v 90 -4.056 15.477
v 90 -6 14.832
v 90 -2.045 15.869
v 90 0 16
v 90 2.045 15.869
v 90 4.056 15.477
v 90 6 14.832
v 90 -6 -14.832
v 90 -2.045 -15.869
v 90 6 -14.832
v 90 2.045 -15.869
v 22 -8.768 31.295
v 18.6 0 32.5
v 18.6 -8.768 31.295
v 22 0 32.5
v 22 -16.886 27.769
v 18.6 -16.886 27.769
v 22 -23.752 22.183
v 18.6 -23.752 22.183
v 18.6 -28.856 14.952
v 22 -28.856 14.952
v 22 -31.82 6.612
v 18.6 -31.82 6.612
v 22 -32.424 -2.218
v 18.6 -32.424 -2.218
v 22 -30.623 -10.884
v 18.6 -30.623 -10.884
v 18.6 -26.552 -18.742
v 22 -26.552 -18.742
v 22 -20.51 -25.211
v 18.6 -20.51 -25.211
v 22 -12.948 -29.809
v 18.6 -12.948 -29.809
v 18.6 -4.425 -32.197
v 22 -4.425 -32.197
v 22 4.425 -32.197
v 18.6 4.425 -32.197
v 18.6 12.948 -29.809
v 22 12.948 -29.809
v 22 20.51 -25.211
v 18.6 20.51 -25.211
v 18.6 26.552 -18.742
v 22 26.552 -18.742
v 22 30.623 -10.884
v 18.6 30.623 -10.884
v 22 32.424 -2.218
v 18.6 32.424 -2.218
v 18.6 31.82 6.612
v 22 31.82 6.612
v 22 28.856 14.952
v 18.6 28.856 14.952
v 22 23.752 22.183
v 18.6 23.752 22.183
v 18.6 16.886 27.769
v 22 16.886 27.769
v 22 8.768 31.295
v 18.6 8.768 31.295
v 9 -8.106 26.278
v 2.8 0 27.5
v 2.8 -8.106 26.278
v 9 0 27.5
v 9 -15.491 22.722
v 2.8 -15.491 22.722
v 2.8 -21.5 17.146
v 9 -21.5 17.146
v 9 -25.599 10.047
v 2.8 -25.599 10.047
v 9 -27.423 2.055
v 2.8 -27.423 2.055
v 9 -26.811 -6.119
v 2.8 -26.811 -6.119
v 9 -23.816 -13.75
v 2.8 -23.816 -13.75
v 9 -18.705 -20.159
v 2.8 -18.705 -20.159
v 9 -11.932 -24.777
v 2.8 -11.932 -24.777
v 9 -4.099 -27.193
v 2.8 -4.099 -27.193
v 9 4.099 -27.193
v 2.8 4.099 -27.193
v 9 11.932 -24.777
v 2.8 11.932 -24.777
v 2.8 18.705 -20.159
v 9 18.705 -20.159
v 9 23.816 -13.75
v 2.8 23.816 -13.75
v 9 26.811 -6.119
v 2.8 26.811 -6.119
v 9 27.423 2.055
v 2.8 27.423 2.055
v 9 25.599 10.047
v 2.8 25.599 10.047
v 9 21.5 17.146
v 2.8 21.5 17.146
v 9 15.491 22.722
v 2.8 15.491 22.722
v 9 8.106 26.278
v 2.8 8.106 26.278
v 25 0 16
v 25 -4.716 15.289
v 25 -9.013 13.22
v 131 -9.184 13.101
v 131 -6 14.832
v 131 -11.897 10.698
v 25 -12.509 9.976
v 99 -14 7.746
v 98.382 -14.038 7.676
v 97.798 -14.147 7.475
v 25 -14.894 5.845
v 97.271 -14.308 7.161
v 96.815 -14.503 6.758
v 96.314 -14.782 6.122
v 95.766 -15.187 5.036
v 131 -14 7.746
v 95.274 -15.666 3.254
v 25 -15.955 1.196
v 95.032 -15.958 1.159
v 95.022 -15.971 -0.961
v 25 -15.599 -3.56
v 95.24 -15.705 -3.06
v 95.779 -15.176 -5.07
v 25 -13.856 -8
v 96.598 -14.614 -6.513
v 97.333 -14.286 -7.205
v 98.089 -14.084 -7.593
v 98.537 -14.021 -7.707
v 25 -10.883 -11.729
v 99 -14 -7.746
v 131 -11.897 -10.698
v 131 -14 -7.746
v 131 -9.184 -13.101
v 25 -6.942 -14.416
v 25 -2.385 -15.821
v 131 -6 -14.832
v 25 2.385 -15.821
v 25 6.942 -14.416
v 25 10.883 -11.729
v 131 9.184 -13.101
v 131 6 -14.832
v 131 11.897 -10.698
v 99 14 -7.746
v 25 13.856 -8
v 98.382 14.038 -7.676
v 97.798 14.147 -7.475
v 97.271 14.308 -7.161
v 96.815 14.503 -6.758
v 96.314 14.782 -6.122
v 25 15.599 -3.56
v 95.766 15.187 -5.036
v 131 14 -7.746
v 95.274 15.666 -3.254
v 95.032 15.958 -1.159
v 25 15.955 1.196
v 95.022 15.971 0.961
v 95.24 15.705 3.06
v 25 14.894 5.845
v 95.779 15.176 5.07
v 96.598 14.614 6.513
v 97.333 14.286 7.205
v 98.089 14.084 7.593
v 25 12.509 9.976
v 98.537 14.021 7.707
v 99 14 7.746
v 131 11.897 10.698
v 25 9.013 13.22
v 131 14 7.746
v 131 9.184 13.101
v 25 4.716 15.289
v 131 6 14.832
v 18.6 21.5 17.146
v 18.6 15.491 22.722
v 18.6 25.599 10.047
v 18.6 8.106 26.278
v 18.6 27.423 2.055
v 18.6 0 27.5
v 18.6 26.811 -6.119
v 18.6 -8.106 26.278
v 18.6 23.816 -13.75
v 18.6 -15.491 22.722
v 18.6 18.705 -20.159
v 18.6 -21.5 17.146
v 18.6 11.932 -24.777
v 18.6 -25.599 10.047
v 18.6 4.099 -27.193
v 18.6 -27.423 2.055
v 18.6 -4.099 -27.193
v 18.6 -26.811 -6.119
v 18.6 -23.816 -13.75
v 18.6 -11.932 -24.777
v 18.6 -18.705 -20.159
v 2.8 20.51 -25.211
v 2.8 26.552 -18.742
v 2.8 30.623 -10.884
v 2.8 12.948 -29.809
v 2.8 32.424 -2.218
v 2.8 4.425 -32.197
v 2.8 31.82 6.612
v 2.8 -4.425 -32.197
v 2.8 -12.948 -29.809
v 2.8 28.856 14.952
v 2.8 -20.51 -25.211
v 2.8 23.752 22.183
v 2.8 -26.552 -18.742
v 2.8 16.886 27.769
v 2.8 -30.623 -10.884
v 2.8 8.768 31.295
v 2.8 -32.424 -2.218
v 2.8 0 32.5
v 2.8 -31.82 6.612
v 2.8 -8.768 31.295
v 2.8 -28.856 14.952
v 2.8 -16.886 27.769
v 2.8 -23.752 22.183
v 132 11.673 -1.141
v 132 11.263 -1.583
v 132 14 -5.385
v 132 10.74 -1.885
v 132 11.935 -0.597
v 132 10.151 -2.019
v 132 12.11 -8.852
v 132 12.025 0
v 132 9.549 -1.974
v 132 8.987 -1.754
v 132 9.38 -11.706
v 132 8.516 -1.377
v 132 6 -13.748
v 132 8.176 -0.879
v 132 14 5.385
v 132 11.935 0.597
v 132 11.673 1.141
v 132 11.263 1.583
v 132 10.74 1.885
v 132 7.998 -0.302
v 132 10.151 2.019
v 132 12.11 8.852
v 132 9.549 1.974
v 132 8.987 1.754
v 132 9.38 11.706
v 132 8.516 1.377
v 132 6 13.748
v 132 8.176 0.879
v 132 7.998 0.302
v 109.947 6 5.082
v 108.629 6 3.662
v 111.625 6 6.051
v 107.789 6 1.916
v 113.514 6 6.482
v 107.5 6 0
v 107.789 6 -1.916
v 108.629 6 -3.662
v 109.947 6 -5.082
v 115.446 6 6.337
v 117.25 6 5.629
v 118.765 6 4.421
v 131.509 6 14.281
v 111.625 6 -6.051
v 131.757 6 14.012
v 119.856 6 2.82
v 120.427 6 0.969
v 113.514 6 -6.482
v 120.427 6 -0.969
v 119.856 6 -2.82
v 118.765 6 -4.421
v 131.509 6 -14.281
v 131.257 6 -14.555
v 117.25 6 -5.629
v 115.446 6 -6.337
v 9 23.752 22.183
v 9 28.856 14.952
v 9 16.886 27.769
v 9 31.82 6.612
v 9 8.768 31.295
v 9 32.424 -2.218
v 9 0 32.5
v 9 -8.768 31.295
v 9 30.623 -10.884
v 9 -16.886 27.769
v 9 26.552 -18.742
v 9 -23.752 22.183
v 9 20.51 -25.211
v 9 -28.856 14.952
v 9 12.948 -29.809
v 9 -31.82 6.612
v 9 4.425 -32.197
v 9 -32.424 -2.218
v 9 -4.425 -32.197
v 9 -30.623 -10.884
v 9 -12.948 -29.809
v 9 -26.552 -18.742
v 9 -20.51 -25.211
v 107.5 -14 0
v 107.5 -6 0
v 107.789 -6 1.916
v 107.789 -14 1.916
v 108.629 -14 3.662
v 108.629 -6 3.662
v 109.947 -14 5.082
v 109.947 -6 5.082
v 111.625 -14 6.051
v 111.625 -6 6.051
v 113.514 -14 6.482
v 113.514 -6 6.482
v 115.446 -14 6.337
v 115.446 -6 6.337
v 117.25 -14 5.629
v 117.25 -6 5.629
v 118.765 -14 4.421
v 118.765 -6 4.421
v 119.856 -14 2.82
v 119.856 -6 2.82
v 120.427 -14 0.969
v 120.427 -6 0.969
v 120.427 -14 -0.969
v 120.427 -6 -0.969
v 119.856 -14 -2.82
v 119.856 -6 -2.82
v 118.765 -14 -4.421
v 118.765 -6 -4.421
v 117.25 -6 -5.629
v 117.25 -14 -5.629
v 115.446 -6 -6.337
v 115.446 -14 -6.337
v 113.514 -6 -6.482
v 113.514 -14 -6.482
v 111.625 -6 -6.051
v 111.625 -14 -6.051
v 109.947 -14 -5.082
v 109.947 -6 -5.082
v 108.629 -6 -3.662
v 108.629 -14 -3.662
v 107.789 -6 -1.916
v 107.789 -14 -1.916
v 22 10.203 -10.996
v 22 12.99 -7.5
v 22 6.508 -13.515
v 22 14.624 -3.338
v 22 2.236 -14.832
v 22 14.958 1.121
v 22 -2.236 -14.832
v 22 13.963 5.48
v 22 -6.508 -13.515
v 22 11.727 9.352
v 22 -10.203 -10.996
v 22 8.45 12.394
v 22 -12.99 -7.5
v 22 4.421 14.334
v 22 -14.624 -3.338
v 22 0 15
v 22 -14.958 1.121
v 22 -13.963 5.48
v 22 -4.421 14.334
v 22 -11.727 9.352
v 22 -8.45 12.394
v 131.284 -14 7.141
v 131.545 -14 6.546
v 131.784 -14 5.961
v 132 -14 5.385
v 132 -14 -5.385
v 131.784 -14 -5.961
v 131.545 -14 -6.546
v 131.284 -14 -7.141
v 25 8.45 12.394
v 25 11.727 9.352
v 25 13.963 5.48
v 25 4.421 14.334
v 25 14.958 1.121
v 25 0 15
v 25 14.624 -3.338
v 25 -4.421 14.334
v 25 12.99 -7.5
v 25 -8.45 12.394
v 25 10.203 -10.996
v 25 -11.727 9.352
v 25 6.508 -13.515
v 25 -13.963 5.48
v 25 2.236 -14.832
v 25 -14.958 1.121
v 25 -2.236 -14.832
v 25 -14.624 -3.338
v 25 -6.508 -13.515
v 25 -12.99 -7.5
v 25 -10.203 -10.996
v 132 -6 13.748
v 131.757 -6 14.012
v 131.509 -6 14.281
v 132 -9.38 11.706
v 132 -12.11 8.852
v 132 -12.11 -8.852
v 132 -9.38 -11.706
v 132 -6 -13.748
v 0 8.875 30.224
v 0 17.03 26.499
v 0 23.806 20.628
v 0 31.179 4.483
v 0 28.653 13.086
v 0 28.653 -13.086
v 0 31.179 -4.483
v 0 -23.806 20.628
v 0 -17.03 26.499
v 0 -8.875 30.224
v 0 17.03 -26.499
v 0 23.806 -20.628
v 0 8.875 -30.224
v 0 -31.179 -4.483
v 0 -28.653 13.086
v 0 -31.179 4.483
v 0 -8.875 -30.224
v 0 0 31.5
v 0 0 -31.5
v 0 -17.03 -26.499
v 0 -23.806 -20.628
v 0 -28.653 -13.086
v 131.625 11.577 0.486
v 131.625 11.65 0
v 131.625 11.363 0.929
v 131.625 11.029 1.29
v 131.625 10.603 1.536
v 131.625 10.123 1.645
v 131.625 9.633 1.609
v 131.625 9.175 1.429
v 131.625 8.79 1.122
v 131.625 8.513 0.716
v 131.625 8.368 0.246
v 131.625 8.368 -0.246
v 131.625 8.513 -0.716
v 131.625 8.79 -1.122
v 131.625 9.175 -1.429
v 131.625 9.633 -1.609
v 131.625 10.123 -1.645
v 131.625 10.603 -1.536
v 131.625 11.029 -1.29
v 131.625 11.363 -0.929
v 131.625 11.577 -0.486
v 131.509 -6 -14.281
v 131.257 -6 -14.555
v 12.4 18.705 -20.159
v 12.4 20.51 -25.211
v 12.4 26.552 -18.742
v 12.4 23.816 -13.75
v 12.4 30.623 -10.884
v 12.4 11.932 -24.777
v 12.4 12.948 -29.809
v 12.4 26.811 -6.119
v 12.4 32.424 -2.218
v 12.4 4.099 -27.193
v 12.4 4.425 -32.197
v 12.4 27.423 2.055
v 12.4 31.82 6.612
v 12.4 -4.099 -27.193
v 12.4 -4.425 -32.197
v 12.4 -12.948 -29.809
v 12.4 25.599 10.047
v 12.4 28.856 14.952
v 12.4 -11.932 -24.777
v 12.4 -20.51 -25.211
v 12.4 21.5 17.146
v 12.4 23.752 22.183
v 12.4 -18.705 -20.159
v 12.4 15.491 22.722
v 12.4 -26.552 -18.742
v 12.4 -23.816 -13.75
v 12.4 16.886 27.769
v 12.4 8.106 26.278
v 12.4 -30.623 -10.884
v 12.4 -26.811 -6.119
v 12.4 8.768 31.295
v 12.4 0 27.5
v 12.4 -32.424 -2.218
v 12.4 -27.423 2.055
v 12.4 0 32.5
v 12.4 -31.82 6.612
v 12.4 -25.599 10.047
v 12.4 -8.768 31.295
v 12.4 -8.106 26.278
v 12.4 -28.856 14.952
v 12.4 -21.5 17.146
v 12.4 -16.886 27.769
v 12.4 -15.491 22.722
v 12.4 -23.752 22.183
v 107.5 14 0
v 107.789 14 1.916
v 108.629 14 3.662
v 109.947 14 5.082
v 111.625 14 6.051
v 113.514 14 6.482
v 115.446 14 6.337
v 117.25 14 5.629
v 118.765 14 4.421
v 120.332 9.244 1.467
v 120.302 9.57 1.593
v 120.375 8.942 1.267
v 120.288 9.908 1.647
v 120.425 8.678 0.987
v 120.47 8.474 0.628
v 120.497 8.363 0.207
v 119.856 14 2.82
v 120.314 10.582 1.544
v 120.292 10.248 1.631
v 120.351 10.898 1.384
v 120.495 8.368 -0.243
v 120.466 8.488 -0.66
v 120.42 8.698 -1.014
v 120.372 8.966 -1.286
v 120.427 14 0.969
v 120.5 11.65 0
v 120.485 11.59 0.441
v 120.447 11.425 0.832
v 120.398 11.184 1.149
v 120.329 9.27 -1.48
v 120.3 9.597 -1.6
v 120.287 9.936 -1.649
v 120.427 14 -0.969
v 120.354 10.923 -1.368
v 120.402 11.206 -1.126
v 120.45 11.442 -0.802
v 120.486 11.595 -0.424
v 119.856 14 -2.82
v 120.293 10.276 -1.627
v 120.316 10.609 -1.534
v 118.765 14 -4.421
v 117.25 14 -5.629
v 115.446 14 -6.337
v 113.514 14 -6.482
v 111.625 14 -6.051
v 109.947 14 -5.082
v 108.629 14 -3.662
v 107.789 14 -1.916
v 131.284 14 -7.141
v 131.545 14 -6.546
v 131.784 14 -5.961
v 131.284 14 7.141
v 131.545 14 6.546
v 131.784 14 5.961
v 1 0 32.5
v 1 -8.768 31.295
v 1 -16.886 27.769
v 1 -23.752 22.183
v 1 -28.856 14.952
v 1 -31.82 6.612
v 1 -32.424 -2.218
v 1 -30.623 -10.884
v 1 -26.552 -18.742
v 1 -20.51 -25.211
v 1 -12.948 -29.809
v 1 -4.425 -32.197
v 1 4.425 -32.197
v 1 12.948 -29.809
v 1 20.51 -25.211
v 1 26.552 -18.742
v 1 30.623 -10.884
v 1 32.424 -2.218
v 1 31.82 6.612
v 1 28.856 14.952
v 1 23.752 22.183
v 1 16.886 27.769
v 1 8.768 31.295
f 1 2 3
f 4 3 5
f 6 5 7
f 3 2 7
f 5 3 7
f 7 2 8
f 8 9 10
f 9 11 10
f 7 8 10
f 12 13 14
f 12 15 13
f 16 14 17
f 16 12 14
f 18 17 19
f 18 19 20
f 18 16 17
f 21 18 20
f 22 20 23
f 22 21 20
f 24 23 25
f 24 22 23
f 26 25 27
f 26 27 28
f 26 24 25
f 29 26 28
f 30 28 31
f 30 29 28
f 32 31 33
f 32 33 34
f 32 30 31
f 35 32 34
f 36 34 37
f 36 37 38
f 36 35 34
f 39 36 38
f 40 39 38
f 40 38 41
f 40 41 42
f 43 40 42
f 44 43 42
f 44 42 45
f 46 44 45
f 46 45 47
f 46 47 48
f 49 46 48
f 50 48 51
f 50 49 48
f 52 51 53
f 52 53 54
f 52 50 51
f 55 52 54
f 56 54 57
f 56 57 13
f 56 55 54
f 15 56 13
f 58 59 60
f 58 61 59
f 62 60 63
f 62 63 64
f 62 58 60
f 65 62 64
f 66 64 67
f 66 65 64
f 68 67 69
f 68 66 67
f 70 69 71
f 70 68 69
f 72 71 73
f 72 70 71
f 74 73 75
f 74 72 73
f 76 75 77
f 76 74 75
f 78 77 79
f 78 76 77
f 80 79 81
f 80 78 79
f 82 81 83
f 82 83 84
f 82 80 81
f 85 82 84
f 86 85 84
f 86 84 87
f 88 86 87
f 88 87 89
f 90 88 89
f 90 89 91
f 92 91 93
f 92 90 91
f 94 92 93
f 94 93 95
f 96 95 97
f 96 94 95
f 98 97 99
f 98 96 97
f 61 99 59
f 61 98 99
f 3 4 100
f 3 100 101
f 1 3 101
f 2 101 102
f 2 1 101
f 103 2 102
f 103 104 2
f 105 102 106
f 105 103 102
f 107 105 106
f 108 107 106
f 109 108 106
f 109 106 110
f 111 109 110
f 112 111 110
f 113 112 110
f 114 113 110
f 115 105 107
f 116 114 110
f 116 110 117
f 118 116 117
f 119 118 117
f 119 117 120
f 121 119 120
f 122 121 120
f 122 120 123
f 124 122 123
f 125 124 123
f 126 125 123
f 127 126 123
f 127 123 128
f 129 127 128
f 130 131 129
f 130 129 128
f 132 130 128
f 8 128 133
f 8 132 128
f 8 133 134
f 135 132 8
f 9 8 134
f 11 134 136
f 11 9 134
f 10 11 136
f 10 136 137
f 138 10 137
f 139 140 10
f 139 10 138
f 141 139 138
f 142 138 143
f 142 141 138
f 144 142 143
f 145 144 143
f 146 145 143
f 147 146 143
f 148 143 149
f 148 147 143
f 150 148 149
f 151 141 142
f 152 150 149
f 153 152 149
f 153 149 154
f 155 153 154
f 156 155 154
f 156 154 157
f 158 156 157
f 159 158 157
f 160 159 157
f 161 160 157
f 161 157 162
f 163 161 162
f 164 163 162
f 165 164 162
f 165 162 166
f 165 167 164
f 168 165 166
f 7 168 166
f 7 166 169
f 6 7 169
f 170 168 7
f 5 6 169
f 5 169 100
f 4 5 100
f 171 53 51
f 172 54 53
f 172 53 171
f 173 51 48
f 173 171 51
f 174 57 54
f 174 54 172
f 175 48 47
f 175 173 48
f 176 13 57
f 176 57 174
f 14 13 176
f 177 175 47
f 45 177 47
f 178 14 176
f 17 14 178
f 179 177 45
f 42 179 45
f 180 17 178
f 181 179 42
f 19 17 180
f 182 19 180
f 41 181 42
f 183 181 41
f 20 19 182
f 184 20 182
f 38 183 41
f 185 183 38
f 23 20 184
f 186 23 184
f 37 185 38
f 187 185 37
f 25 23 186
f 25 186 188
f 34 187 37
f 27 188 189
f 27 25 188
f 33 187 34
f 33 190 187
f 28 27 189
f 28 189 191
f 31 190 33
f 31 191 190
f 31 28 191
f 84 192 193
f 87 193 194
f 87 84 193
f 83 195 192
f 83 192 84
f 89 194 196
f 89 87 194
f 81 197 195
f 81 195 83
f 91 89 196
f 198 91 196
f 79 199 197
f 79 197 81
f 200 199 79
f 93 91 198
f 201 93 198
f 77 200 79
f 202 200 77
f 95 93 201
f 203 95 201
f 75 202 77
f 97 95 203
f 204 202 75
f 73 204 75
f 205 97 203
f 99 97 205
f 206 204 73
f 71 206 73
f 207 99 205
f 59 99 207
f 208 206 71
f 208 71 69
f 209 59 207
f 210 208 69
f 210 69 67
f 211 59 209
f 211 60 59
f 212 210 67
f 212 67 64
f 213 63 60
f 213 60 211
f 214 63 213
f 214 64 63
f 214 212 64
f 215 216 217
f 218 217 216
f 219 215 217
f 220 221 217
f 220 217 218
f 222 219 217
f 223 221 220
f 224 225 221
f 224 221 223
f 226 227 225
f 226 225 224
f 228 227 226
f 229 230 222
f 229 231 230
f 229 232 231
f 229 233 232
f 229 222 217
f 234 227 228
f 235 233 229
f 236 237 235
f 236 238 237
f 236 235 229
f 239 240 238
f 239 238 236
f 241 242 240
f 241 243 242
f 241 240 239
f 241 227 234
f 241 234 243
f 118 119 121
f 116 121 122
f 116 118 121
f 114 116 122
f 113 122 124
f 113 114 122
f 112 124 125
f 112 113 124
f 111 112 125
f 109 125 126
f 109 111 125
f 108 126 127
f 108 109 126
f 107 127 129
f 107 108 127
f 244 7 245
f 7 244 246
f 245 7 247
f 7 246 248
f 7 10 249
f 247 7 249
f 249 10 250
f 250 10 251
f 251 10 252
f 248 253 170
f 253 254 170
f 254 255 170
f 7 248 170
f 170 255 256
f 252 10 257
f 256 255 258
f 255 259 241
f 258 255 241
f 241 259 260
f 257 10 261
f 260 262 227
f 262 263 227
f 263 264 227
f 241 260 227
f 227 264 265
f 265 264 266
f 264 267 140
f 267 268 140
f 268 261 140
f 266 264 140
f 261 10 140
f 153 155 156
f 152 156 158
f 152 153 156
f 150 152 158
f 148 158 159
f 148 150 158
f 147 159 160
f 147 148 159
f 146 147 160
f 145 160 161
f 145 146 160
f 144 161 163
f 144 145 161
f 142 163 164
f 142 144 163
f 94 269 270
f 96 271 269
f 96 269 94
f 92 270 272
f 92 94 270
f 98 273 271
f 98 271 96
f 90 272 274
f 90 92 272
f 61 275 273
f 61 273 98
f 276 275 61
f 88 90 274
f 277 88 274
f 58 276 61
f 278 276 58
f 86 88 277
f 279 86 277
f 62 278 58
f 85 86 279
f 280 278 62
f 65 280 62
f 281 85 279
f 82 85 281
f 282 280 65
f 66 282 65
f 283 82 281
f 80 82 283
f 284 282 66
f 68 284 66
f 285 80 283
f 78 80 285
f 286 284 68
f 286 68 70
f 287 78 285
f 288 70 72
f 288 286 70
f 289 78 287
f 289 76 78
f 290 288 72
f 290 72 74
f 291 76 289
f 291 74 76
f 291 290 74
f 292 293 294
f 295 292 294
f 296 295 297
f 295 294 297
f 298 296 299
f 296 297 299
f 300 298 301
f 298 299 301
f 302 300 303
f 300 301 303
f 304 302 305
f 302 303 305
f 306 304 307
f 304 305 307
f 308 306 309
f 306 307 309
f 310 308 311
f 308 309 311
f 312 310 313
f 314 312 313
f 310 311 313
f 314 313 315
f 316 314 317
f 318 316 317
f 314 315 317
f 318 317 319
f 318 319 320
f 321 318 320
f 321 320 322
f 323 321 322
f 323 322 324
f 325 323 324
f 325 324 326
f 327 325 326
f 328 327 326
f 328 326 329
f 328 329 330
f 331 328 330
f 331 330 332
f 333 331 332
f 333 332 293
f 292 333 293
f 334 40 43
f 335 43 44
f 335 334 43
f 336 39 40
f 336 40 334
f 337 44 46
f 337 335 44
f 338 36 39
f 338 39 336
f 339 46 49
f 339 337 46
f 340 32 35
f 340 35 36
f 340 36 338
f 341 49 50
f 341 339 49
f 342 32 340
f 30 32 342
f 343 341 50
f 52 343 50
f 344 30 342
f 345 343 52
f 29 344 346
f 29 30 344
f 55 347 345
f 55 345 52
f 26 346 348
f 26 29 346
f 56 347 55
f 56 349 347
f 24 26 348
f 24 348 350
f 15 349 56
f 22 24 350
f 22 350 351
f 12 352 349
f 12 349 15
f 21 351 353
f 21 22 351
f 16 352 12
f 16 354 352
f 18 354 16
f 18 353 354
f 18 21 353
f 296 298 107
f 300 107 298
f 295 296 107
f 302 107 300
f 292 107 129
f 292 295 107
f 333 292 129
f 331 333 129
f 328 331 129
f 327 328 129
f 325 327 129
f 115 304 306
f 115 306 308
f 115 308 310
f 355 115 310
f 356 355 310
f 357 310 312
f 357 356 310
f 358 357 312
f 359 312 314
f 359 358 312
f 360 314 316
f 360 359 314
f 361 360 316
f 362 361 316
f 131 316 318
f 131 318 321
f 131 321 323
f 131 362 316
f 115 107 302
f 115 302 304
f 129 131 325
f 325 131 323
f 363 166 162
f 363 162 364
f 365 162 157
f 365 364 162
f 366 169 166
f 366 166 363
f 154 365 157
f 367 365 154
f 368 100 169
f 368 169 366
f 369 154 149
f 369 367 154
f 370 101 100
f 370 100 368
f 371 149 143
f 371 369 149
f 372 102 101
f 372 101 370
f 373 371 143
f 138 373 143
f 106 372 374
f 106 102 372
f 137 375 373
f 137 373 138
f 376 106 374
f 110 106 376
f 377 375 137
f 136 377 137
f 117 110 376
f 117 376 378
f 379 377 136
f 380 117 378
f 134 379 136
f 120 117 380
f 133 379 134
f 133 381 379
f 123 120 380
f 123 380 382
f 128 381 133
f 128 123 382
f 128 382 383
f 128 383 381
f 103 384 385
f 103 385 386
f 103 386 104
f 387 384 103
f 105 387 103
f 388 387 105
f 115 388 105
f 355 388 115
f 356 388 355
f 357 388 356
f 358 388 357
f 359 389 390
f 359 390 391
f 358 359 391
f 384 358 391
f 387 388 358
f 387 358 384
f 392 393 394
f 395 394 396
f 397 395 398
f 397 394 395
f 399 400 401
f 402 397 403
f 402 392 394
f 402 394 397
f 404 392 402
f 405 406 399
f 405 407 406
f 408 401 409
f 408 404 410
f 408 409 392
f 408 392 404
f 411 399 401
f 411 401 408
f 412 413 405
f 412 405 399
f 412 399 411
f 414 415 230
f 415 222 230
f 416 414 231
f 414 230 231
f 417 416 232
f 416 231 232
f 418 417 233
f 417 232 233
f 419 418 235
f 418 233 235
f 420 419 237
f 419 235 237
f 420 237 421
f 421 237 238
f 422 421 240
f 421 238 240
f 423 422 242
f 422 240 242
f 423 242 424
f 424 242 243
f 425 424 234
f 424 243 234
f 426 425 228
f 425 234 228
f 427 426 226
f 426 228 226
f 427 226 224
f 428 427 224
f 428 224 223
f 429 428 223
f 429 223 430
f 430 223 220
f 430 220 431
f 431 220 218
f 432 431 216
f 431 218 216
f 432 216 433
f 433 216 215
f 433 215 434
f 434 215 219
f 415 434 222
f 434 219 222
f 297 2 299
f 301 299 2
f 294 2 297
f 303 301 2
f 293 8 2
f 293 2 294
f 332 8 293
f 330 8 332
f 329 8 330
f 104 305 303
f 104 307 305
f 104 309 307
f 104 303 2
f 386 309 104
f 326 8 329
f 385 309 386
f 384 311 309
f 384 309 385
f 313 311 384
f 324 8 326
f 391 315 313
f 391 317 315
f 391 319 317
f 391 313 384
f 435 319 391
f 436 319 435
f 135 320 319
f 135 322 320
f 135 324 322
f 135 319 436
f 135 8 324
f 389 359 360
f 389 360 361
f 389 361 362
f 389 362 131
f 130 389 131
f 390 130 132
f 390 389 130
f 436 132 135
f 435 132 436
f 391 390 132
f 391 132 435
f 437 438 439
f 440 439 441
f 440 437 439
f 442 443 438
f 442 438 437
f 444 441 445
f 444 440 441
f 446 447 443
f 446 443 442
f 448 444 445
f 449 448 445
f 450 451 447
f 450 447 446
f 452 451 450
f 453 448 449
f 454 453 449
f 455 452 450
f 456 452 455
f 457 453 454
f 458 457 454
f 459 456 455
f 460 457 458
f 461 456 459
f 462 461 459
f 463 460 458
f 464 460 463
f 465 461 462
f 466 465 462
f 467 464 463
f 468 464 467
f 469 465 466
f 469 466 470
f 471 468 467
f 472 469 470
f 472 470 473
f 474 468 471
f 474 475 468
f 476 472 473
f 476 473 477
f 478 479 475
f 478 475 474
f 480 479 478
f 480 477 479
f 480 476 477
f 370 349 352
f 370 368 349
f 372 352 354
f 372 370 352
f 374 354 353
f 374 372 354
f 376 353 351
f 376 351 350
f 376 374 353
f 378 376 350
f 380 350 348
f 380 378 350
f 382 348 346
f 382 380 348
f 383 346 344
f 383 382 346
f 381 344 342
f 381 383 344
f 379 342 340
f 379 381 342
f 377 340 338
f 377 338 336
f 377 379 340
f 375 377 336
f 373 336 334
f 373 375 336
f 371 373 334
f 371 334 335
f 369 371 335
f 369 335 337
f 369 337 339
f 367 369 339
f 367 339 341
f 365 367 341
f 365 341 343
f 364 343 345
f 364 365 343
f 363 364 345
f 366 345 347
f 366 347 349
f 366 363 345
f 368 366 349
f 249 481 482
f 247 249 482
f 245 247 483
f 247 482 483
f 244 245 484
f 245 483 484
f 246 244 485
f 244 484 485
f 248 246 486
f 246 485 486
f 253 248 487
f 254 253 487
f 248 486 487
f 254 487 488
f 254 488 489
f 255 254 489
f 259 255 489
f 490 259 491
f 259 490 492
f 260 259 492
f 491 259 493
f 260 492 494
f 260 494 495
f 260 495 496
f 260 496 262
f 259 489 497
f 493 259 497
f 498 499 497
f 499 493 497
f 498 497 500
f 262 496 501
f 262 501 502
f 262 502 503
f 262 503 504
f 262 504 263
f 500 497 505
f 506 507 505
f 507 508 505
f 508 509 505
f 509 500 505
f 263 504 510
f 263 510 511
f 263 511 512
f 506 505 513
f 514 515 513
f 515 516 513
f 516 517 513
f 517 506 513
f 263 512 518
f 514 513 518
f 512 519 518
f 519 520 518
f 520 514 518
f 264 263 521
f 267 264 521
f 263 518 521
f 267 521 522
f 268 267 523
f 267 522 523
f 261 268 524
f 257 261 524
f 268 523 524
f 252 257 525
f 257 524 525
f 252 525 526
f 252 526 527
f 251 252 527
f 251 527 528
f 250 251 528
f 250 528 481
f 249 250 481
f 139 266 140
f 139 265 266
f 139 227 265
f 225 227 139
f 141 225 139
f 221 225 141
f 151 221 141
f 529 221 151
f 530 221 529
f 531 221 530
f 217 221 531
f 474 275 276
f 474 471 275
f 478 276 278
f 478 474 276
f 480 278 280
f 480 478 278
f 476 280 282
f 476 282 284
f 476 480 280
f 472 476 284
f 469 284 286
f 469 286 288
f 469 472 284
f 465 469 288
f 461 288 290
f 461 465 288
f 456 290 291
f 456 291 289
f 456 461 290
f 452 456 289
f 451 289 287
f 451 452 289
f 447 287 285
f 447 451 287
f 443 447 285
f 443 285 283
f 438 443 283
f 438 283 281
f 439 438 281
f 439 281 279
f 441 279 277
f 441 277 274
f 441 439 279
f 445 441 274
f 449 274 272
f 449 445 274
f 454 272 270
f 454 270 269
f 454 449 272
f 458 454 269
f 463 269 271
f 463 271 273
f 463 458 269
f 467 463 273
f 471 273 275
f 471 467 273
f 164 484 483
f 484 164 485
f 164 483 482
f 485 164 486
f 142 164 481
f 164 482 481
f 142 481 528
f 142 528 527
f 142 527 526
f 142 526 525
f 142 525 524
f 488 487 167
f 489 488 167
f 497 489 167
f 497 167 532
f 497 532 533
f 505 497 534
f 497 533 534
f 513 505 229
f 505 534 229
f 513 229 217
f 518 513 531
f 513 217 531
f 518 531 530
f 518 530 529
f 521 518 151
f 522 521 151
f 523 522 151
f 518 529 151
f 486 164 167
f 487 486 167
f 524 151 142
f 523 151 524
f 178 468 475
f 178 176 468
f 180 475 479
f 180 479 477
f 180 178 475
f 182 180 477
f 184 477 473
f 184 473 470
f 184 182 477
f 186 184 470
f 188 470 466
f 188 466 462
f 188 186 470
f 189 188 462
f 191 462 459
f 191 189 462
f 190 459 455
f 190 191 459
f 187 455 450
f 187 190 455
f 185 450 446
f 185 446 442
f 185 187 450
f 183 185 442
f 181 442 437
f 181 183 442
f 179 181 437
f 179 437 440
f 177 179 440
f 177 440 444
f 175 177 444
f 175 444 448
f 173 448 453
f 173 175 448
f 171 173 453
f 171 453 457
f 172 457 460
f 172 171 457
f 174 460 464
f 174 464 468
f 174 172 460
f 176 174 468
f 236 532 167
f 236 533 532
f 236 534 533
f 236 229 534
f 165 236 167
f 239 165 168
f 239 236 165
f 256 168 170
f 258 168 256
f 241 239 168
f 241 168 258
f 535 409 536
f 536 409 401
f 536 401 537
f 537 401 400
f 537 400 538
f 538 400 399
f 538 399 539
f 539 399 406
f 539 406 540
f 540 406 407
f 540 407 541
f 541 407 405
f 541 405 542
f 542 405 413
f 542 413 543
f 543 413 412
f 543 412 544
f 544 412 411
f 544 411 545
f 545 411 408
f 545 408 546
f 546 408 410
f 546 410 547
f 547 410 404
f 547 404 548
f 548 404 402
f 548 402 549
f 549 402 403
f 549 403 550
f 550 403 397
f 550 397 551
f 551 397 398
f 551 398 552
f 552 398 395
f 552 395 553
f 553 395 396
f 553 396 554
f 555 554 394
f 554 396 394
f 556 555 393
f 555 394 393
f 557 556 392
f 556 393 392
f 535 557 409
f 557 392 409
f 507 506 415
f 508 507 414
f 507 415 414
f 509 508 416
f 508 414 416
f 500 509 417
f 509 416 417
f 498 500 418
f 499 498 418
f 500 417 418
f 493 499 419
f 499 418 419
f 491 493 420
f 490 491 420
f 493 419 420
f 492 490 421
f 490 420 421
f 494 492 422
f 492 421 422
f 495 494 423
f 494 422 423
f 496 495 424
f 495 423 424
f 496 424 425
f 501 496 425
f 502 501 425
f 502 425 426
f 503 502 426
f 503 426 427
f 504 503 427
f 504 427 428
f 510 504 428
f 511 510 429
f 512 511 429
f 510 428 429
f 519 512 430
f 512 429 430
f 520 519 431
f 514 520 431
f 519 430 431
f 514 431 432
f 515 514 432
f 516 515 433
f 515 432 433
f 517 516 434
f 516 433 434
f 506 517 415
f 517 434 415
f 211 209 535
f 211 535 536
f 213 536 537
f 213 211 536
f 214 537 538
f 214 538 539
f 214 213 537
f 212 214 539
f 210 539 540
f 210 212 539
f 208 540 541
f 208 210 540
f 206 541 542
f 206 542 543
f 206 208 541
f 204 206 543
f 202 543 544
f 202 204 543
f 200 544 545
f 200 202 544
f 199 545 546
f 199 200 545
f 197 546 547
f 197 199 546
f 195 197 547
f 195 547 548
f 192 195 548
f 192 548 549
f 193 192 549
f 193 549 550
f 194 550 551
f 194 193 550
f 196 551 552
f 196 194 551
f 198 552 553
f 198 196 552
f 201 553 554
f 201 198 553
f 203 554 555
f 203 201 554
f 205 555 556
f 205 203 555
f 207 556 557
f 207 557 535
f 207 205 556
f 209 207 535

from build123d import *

# Parameters (mm, degrees)
CHAMFER_2_SIZE           = 1
CHAMFER_1_SIZE           = 1
CUT_EXTRUDE_1_DEPTH      = 140.773030303
CUT_EXTRUDE_1_DEPTH_BACK = 140.773030303
SKETCH_2_W               = 45.54274113
SKETCH_2_H               = 12
SKETCH_3_OUTSIDE_W       = 99.17
SKETCH_3_OUTSIDE_H       = 99.17
SKETCH_3_OUTSIDE_W_2     = 70.7839493
SKETCH_3_OUTSIDE_H_2     = 28
CUT_EXTRUDE_1_2_DEPTH    = 38
FILLET_1_R               = 5
SKETCH_4_R               = 6.5
CUT_EXTRUDE_2_DEPTH      = 38


# Read off the part's stored shape, not the designer's step: M4 螺纹孔1
with BuildPart() as part:
    # 草图1 → 旋转1 (revolve)
    with BuildSketch(Plane.XY, mode=Mode.PRIVATE) as revolve_1_sk:
        Polygon((0, 0), (0, 32.5), (2.8, 32.5), (2.8, 27.5), (9, 27.5), (9, 32.5), (12.4, 32.5), (12.4, 27.5), (18.6, 27.5), (18.6, 32.5), (22, 32.5), (22, 15), (25, 15), (25, 16), (132, 16), (132, 0), align=None)
    revolve(revolve_1_sk.sketch.rotate(Axis((0, 0, 0), (1, 0, 0)), 90), axis=Axis((0, 0, 0), (1, 0, 0)))

    # 倒角2
    chamfer_2_edges = [part.edges().sort_by_distance(p)[0] for p in [
        (132, 0, -16),
    ]]
    chamfer(chamfer_2_edges, length=CHAMFER_2_SIZE)

    # 倒角1
    chamfer_1_edges = [part.edges().sort_by_distance(p)[0] for p in [
        (0, 0, -32.5),
    ]]
    chamfer(chamfer_1_edges, length=CHAMFER_1_SIZE)

    # 草图2 → Cut-Extrude 1 (cut, two sides: drawn at the far end of the back side and taken through both)
    with BuildSketch(Plane.XY.offset(-CUT_EXTRUDE_1_DEPTH_BACK)):
        with Locations((112.771370565, 0)):
            Rectangle(SKETCH_2_W, SKETCH_2_H)
    extrude(amount=CUT_EXTRUDE_1_DEPTH + CUT_EXTRUDE_1_DEPTH_BACK, mode=Mode.SUBTRACT)

    # 草图3 outside → Cut-Extrude 1 2 (cut)
    with BuildSketch(Plane(origin=(132, 0, 0), x_dir=(0, 0, -1), z_dir=(1, 0, 0))):
        Rectangle(SKETCH_3_OUTSIDE_W, SKETCH_3_OUTSIDE_H)
        Rectangle(SKETCH_3_OUTSIDE_W_2, SKETCH_3_OUTSIDE_H_2, mode=Mode.SUBTRACT)
    extrude(amount=-CUT_EXTRUDE_1_2_DEPTH, mode=Mode.SUBTRACT)

    # 圆角1
    # the kernel refuses this fillet: 5 mm, written as the material it adds along each edge
    with BuildSketch(Plane(origin=(94, -14, 20.245966692), x_dir=(1, 0, 0), z_dir=(0, 0, -1))) as fillet_1_piece_1_section:
        with BuildLine():
            CenterArc((FILLET_1_R, FILLET_1_R), FILLET_1_R, 180, 90)
            Line((0, FILLET_1_R), (0, 0))
            Line((0, 0), (FILLET_1_R, 0))
        make_face()
    fillet_1_piece_1 = extrude(amount=40.491933385, mode=Mode.PRIVATE)
    fillet_1_piece_1 = fillet_1_piece_1 & Plane(origin=(95.499656212, 0, 0), x_dir=(0, 0, 1), z_dir=(1, 0, 0)) * Cylinder(16, 101, mode=Mode.PRIVATE)
    add(fillet_1_piece_1)
    with BuildSketch(Plane(origin=(94, 14, -20.245966692), x_dir=(1, 0, 0), z_dir=(0, 0, 1))) as fillet_1_piece_2_section:
        with BuildLine():
            CenterArc((FILLET_1_R, FILLET_1_R), FILLET_1_R, 180, 90)
            Line((0, FILLET_1_R), (0, 0))
            Line((0, 0), (FILLET_1_R, 0))
        make_face()
    fillet_1_piece_2 = extrude(amount=40.491933385, mode=Mode.PRIVATE)
    fillet_1_piece_2 = fillet_1_piece_2 & Plane(origin=(95.499656212, 0, 0), x_dir=(0, 0, 1), z_dir=(1, 0, 0)) * Cylinder(16, 101, mode=Mode.PRIVATE)
    add(fillet_1_piece_2)

    # 草图4 → 切除-拉伸2 (cut)
    with BuildSketch(Plane(origin=(0, 14, 0), x_dir=(1, 0, 0), z_dir=(0, 1, 0))):
        with Locations(Location((114, 0, 0), (0, 0, 180))):
            Circle(SKETCH_4_R)
    extrude(amount=-CUT_EXTRUDE_2_DEPTH, mode=Mode.SUBTRACT)

    # M4 螺纹孔1 outline → M4 螺纹孔1 (revolve, cut)
    with BuildSketch(Plane(origin=(0, 10, 0), x_dir=(0, 1, 0), z_dir=(0, 0, -1))):
        Polygon((0, 120.286969782), (1.65, 120.286969782), (1.65, 131.625), (2.025, 132), (0, 132), align=None)
    revolve(axis=Axis((0, 10, 0), (1, 0, 0)), mode=Mode.SUBTRACT)


solid = part.part
